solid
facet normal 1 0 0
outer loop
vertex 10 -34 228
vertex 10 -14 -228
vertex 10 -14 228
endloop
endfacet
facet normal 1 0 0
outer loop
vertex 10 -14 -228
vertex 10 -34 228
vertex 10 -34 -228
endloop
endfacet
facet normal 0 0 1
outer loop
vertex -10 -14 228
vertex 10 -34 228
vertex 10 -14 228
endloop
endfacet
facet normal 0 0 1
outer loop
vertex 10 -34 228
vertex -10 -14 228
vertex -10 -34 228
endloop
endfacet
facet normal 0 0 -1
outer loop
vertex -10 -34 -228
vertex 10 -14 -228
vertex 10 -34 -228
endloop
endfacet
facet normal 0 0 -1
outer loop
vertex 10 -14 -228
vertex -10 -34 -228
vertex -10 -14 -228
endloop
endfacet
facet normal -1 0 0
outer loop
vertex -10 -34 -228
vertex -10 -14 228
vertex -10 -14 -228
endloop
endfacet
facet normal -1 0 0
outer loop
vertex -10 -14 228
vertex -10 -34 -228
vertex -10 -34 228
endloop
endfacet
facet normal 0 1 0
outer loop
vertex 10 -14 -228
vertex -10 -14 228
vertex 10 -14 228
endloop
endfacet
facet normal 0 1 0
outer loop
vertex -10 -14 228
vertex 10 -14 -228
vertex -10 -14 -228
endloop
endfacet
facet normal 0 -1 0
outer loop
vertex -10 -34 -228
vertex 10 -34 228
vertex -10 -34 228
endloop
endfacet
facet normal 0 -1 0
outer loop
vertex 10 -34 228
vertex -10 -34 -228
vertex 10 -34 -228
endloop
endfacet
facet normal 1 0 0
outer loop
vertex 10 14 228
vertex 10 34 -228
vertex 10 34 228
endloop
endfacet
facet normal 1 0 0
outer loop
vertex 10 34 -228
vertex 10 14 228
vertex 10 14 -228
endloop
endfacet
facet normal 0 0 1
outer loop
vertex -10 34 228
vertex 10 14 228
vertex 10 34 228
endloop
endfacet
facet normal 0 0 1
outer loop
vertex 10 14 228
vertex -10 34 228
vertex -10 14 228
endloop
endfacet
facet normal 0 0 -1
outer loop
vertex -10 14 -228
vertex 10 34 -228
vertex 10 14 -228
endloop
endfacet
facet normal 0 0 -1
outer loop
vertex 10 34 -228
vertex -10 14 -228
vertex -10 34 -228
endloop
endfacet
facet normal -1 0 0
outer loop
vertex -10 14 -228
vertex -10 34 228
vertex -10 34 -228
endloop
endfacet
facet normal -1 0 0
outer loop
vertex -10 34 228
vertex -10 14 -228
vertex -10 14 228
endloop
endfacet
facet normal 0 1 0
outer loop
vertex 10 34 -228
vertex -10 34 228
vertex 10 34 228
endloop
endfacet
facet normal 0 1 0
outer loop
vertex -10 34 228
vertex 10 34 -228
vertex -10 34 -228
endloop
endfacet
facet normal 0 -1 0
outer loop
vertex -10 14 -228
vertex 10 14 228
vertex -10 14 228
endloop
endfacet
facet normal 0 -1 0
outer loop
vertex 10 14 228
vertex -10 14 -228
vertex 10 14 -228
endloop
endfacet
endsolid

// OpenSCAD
// ============================================================================
// Atom Lithography Machine — Parametric OpenSCAD Module (S6.11-04)
// ============================================================================
// part_id           : S6.11-04
// parent_bom_id     : S6.11
// subsystem         : S6
// part_name         : Kriyo-Koaksiyel Demet & Zayiflatici Paketi (96 hat: CuNi/NbTi, 0.86 mm, Exp140 S6.5-04, 4.03 kg)
// material          : CuNi
// temp_stage        : 300 K -> 20 mK
// vacuum_grade      : Kriyo-vakum
// tolerance         : 0.86 mm, <=0.1 dB/m
// computed_mass_kg  : 0.70712
// envelope_mm       : 20.000 x 68.000 x 456.000
// design_maturity   : M0_M1_DETAILED_CAD_DESIGN_ONLY
// no_lab_measurement: true
// iec61508_certified: false
// semi_s2_certified : false
// Units: millimeters (mm)
// ============================================================================

$fn = 64;

// Nominal bounding envelope parameters (mm)
bbox_x = 20.0000;
bbox_y = 68.0000;
bbox_z = 456.0000;

// Part-specific parametric dimensions
n_lines = 96;
coax_od_mm = 0.86;
mass_kg = 4.03;

// Interface / port parameters (mm)

module part_S6_11_04() {
  union() {
    // 48-line CuNi/NbTi cryo coax & Eccosorb bundle (south48)
    translate([0.000, -24.000, 0.000]) cube([20.000, 20.000, 456.000], center=true);
    // 48-line CuNi/NbTi cryo coax & Eccosorb bundle (north48)
    translate([0.000, 24.000, 0.000]) cube([20.000, 20.000, 456.000], center=true);
  }
}

// World assembly mounting transform (global machine frame, mm / deg):
// translate([-716.000, 0.000, 730.000]) rotate([0.000, 0.000, 0.000]) part_S6_11_04();

part_S6_11_04();
